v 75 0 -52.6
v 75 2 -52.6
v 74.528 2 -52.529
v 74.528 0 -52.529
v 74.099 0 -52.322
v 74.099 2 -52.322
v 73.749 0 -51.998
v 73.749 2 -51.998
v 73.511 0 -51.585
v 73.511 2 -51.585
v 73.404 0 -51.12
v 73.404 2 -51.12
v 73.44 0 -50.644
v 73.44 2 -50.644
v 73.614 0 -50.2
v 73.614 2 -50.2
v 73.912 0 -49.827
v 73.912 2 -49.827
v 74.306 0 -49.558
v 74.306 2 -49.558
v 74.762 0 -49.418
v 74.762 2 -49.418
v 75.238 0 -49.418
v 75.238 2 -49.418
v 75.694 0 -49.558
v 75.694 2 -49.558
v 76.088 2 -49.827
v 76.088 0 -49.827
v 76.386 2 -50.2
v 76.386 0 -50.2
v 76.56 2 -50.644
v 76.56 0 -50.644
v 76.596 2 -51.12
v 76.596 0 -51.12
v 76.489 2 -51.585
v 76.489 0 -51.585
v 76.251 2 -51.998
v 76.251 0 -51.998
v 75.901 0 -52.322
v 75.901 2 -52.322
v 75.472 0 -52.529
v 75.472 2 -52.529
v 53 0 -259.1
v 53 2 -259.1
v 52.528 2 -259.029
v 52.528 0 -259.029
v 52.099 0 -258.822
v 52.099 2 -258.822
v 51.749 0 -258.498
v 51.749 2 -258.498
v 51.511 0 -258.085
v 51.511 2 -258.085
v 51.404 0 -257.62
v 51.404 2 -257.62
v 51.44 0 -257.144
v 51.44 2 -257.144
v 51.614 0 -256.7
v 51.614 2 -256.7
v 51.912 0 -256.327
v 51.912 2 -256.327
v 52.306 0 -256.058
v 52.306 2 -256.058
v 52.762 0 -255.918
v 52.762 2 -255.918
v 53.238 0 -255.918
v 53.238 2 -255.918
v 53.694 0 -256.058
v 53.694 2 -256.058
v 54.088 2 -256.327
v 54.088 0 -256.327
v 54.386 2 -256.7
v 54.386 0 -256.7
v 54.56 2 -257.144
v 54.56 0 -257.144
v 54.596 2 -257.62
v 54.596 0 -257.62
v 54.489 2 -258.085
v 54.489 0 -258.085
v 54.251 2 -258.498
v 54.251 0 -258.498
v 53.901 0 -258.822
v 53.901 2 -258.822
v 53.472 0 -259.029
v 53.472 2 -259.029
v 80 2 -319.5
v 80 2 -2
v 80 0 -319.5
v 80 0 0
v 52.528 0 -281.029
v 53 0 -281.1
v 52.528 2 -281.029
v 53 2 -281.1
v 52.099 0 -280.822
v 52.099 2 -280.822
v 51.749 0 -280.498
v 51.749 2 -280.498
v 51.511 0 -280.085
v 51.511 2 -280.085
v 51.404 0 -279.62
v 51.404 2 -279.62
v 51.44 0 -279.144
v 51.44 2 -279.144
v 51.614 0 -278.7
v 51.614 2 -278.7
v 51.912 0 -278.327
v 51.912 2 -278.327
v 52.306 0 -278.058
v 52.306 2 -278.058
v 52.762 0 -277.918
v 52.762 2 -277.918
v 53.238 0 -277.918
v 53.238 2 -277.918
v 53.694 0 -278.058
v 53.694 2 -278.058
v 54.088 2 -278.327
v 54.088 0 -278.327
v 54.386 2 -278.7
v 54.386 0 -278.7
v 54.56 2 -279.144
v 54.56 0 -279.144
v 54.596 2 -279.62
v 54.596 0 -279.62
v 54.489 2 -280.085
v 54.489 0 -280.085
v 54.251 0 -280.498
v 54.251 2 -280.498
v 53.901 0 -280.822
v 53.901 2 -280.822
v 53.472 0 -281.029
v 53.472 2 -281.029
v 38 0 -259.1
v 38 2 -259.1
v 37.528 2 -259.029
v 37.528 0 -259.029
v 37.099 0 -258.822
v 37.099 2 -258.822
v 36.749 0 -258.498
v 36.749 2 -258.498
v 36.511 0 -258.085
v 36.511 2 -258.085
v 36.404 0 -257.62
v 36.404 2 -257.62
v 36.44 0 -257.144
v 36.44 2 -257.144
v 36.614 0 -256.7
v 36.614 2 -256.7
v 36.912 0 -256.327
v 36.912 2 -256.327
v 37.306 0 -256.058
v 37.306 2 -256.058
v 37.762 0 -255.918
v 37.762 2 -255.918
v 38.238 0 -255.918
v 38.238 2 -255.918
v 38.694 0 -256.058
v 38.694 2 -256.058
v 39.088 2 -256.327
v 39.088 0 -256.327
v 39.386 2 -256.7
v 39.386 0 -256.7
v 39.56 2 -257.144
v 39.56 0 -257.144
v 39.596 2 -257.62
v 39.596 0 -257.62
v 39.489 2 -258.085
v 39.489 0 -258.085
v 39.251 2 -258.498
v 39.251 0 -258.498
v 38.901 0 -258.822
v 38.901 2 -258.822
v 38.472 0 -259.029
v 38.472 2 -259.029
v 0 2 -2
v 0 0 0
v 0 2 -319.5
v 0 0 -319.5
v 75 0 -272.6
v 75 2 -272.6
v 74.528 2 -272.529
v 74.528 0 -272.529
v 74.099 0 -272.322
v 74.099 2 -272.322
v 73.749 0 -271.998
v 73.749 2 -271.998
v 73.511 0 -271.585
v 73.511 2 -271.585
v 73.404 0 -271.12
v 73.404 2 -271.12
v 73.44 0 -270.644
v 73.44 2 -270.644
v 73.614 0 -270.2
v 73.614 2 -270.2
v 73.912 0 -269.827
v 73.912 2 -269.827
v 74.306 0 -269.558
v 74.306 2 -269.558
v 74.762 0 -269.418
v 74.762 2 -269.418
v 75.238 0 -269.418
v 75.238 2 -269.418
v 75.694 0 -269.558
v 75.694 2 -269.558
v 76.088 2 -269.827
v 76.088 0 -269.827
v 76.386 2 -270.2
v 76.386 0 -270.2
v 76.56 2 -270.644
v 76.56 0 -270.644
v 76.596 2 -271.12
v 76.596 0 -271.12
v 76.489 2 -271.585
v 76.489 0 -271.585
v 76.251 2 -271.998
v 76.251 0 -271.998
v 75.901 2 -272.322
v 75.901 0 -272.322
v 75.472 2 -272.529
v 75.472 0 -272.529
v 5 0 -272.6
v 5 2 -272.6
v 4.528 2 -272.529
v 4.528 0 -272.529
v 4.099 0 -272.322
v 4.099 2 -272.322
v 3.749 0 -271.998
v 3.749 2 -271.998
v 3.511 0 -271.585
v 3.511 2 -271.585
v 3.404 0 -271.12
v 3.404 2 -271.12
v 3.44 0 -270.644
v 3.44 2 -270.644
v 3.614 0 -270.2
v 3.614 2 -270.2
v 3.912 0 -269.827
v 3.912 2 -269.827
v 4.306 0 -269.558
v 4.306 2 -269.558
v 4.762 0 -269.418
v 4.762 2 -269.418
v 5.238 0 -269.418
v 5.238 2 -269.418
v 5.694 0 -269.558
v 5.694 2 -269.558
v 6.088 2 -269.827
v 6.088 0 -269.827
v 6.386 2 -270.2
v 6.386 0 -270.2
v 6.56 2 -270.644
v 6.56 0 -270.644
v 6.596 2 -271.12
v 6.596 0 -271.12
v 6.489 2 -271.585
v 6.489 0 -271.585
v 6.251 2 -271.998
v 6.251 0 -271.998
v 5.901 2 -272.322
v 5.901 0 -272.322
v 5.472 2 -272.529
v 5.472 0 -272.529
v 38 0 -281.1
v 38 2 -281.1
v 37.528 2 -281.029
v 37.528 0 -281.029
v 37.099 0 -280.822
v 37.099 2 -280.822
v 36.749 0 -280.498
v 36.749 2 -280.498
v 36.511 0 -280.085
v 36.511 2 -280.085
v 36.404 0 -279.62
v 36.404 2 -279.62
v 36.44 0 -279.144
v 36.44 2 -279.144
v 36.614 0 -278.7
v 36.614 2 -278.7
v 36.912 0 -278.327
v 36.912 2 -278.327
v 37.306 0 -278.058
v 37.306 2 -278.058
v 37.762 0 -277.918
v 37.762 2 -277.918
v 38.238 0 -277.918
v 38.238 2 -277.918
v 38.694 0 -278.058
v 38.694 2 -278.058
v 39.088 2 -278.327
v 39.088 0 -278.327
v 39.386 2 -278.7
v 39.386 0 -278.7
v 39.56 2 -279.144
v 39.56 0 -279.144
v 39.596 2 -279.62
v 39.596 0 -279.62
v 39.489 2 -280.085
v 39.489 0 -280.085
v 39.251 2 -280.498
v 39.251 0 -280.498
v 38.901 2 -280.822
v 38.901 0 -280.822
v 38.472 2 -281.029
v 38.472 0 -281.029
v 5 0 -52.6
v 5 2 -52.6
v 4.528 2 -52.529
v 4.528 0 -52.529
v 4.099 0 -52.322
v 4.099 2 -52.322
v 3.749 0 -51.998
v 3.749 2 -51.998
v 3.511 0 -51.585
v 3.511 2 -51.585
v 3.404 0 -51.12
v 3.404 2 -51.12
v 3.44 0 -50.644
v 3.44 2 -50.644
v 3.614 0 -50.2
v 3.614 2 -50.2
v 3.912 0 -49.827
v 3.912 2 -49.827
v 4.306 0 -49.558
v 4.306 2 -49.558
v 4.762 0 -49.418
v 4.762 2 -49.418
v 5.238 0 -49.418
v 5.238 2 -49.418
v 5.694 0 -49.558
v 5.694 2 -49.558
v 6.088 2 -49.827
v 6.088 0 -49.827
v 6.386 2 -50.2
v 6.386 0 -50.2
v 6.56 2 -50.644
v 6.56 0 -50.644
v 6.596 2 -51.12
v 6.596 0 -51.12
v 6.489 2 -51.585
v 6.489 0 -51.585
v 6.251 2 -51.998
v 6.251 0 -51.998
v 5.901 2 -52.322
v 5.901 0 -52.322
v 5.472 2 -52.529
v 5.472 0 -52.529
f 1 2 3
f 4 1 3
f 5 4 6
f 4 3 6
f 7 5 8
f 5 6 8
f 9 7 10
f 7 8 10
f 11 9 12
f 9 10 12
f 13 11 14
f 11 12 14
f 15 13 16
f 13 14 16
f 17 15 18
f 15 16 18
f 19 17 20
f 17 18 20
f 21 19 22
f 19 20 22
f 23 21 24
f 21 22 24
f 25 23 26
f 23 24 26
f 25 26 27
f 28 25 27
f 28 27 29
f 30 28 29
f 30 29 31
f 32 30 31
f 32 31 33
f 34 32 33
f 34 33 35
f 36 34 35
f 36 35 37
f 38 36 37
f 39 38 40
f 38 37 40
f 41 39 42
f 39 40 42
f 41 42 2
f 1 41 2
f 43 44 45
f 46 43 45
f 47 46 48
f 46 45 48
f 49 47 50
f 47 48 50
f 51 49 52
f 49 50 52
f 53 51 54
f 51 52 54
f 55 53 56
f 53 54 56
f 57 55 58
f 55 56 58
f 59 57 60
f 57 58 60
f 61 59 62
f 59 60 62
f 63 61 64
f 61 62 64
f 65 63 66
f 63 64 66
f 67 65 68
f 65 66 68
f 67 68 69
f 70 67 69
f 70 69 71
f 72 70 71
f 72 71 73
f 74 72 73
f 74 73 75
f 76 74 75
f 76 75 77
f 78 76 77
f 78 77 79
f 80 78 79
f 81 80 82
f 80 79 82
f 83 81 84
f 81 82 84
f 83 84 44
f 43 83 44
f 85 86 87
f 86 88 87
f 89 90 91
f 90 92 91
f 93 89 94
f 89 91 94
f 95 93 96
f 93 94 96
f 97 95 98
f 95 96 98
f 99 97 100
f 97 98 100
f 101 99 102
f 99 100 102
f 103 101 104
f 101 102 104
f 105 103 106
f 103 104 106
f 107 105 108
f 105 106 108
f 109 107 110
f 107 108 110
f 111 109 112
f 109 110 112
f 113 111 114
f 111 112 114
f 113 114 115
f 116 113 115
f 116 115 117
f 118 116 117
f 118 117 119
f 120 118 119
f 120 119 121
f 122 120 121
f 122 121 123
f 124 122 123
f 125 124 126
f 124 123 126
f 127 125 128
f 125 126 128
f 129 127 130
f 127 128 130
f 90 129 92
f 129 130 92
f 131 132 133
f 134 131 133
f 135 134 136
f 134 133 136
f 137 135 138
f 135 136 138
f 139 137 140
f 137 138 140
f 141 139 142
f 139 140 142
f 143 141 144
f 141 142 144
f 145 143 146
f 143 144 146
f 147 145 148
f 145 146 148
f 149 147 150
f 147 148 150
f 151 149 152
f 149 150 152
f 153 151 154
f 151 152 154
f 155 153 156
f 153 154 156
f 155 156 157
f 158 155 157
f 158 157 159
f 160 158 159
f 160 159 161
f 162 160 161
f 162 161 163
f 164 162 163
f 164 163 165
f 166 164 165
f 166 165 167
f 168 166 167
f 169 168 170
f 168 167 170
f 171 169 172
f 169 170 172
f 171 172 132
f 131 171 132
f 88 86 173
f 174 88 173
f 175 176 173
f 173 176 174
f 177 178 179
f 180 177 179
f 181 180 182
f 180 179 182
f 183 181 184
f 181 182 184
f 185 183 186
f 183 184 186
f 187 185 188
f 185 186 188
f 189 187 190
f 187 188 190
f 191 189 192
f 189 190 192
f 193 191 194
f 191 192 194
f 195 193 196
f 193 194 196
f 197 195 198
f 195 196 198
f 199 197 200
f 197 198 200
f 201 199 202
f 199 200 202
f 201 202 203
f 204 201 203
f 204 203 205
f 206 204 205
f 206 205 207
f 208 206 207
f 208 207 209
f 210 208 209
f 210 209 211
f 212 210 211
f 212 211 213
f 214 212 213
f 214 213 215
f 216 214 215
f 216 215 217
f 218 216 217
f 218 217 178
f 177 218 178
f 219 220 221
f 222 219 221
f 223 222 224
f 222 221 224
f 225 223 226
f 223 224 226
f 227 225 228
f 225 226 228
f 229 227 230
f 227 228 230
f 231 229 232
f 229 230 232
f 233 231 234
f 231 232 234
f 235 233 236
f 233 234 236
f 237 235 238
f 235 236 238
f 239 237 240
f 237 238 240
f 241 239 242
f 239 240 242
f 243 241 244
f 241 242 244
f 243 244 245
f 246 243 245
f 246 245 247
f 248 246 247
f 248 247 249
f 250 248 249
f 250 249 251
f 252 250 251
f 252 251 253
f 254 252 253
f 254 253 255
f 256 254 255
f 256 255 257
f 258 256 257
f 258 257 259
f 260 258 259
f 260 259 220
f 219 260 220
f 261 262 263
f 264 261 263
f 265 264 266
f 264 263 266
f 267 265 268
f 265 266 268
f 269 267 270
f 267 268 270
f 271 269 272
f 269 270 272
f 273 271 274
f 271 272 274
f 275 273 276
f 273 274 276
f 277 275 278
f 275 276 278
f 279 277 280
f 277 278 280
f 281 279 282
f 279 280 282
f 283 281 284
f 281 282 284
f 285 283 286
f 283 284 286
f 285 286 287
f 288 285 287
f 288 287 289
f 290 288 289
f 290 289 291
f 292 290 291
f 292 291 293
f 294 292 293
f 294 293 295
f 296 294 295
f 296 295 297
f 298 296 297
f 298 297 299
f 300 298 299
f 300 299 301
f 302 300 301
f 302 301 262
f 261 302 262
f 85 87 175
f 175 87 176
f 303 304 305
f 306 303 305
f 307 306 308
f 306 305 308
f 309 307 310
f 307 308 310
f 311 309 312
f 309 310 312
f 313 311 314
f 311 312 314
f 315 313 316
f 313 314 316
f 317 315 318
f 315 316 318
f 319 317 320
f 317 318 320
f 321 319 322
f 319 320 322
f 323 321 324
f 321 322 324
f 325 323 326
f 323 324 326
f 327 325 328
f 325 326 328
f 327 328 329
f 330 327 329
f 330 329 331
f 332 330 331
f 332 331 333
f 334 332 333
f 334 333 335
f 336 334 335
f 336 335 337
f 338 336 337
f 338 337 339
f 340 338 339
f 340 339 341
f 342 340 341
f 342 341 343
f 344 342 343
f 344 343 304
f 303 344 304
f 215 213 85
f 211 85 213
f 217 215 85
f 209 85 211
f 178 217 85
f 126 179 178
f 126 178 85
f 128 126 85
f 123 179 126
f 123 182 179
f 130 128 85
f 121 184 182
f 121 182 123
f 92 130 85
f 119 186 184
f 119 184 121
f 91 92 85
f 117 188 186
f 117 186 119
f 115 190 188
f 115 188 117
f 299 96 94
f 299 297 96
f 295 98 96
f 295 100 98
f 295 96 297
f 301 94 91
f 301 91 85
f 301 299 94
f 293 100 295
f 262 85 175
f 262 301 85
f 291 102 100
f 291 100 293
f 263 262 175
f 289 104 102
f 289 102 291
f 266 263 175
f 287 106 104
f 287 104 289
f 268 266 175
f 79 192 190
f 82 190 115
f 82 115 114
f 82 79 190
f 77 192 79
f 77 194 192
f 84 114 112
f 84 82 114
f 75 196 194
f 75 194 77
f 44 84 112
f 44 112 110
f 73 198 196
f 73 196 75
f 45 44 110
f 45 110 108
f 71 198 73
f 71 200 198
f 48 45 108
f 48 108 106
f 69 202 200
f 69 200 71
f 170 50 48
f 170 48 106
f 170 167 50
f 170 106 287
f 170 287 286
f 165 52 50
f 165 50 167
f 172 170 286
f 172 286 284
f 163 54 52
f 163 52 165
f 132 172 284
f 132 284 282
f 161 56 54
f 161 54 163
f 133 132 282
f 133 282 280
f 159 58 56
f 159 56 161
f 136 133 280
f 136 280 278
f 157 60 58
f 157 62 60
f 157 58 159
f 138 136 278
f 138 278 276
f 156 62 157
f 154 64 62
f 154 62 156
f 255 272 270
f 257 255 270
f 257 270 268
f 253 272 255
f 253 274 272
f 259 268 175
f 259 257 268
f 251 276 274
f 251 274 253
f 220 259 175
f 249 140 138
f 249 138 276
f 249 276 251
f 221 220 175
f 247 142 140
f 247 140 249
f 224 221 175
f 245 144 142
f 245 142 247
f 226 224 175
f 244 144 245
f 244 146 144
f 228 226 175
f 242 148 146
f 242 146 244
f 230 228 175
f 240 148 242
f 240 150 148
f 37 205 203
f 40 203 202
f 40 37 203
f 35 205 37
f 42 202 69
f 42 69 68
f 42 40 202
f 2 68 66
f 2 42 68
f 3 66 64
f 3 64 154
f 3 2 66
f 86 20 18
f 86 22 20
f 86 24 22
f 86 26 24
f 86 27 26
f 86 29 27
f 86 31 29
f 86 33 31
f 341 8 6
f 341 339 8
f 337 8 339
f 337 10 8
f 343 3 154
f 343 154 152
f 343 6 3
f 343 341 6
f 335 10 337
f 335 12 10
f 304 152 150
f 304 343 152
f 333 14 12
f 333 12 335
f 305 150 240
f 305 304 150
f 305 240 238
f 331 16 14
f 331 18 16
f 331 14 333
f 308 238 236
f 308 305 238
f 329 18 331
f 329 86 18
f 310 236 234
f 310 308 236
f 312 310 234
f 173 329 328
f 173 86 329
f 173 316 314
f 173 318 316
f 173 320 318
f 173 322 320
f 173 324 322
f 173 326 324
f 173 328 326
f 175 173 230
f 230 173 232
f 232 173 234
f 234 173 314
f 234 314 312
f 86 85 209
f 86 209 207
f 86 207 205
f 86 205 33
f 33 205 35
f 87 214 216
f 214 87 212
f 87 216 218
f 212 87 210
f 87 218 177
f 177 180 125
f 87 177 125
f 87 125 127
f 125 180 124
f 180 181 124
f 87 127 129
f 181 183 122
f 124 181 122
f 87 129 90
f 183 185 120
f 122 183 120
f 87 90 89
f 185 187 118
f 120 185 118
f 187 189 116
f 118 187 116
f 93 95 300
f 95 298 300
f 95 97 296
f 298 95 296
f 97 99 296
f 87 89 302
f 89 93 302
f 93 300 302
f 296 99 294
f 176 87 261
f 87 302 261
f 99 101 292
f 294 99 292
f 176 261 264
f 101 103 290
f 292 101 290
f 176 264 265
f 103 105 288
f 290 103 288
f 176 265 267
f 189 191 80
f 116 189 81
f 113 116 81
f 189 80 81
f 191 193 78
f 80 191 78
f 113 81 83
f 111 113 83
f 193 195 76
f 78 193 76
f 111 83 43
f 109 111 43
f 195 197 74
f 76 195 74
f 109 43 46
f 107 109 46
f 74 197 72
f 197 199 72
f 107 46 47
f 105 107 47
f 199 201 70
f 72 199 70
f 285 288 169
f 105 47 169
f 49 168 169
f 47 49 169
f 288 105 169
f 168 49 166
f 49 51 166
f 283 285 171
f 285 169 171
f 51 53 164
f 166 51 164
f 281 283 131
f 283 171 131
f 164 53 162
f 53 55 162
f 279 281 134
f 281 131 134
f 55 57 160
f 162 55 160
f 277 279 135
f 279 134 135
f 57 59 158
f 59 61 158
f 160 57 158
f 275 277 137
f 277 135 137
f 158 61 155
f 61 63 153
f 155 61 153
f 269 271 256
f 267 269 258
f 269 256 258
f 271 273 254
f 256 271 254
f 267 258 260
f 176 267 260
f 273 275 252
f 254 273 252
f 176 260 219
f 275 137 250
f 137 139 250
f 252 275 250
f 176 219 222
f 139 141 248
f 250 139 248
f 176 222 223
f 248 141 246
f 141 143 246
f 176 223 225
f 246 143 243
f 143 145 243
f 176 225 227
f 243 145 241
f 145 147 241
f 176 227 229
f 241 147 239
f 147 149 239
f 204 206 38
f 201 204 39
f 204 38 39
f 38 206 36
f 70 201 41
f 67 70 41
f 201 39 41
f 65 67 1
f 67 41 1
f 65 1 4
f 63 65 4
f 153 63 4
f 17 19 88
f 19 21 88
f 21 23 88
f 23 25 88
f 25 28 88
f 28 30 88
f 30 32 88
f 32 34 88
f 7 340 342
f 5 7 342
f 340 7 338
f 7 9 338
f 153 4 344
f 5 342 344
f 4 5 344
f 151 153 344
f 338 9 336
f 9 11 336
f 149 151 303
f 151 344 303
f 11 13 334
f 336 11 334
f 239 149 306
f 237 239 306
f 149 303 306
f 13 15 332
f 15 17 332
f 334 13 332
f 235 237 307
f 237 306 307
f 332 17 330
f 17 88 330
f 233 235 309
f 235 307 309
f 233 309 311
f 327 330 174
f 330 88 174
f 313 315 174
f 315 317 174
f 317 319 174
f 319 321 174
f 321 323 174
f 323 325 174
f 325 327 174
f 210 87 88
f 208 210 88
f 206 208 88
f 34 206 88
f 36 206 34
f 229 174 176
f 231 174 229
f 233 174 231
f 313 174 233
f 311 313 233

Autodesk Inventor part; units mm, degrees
ref_plane "YZ Plane" through (0, 0, 0) normal (1, 0, 0) x (0, 1, 0)
ref_plane "XZ Plane" through (0, 0, 0) normal (0, 1, 0) x (-1, 0, 0)
ref_plane "XY Plane" through (0, 0, 0) normal (0, 0, 1) x (1, 0, 0)
sketch "スケッチ1" plane through (0, 0, 0) normal (0, 1, 0) x (-1, 0, 0)
  line L0 (0, 0) -> (-80, 0)
  line L1 (-80, 0) -> (-80, -319.5)
  line L2 (-80, -319.5) -> (0, -319.5)
  line L3 (0, -319.5) -> (0, 0)
  dimension "d0" = 319.5
  dimension "d1" = 80
extrude "押し出し1" add sketch "スケッチ1" along normal blind 2
sketch "スケッチ3" plane through (0, 0, 0) normal (0, -1, 0) x (1, 0, 0)
  line L0 (80, -319.5) -> (0, -319.5) projected
  line L1 (80, 0) -> (80, -319.5) projected
  point P0 (0, 0)
  point P1 (53, -279.5)
  point P2 (38, -279.5)
  point P3 (53, -257.5)
  point P4 (38, -257.5)
  dimension "d20" = 40
  dimension "d21" = 27
  dimension "d24" = 15
  dimension "d27" = 22
hole "穴1" at (53, 0, -279.5) at (38, 0, -279.5) at (53, 0, -257.5) at (38, 0, -257.5) direction (0, 1, 0) diameter 3.2 end through all
chamfer "面取り2" distance 2 angle 45 1 edges at (40, 2, 0)
sketch "スケッチ5" plane through (0, 0, 0) normal (0, -1, 0) x (1, 0, 0)
  line L0 (80, 0) -> (80, -319.5) projected
  line L1 (0, 0) -> (80, 0) projected
  line L2 (0, -319.5) -> (0, 0) projected
  point P0 (75, -51)
  point P1 (75, -271)
  point P2 (5, -51)
  point P3 (5, -271)
  dimension "d43" = 5
  dimension "d44" = 51
  dimension "d45" = 220
  dimension "d53" = 5
  dimension "d54" = 51
  dimension "d55" = 220
  dimension "d56" = 5
hole "穴2" at (75, 0, -51) at (75, 0, -271) at (5, 0, -51) at (5, 0, -271) direction (0, 1, 0) diameter 3.2 end through all
properties part number "前カバー中盤" material "ABS プラスチック"
